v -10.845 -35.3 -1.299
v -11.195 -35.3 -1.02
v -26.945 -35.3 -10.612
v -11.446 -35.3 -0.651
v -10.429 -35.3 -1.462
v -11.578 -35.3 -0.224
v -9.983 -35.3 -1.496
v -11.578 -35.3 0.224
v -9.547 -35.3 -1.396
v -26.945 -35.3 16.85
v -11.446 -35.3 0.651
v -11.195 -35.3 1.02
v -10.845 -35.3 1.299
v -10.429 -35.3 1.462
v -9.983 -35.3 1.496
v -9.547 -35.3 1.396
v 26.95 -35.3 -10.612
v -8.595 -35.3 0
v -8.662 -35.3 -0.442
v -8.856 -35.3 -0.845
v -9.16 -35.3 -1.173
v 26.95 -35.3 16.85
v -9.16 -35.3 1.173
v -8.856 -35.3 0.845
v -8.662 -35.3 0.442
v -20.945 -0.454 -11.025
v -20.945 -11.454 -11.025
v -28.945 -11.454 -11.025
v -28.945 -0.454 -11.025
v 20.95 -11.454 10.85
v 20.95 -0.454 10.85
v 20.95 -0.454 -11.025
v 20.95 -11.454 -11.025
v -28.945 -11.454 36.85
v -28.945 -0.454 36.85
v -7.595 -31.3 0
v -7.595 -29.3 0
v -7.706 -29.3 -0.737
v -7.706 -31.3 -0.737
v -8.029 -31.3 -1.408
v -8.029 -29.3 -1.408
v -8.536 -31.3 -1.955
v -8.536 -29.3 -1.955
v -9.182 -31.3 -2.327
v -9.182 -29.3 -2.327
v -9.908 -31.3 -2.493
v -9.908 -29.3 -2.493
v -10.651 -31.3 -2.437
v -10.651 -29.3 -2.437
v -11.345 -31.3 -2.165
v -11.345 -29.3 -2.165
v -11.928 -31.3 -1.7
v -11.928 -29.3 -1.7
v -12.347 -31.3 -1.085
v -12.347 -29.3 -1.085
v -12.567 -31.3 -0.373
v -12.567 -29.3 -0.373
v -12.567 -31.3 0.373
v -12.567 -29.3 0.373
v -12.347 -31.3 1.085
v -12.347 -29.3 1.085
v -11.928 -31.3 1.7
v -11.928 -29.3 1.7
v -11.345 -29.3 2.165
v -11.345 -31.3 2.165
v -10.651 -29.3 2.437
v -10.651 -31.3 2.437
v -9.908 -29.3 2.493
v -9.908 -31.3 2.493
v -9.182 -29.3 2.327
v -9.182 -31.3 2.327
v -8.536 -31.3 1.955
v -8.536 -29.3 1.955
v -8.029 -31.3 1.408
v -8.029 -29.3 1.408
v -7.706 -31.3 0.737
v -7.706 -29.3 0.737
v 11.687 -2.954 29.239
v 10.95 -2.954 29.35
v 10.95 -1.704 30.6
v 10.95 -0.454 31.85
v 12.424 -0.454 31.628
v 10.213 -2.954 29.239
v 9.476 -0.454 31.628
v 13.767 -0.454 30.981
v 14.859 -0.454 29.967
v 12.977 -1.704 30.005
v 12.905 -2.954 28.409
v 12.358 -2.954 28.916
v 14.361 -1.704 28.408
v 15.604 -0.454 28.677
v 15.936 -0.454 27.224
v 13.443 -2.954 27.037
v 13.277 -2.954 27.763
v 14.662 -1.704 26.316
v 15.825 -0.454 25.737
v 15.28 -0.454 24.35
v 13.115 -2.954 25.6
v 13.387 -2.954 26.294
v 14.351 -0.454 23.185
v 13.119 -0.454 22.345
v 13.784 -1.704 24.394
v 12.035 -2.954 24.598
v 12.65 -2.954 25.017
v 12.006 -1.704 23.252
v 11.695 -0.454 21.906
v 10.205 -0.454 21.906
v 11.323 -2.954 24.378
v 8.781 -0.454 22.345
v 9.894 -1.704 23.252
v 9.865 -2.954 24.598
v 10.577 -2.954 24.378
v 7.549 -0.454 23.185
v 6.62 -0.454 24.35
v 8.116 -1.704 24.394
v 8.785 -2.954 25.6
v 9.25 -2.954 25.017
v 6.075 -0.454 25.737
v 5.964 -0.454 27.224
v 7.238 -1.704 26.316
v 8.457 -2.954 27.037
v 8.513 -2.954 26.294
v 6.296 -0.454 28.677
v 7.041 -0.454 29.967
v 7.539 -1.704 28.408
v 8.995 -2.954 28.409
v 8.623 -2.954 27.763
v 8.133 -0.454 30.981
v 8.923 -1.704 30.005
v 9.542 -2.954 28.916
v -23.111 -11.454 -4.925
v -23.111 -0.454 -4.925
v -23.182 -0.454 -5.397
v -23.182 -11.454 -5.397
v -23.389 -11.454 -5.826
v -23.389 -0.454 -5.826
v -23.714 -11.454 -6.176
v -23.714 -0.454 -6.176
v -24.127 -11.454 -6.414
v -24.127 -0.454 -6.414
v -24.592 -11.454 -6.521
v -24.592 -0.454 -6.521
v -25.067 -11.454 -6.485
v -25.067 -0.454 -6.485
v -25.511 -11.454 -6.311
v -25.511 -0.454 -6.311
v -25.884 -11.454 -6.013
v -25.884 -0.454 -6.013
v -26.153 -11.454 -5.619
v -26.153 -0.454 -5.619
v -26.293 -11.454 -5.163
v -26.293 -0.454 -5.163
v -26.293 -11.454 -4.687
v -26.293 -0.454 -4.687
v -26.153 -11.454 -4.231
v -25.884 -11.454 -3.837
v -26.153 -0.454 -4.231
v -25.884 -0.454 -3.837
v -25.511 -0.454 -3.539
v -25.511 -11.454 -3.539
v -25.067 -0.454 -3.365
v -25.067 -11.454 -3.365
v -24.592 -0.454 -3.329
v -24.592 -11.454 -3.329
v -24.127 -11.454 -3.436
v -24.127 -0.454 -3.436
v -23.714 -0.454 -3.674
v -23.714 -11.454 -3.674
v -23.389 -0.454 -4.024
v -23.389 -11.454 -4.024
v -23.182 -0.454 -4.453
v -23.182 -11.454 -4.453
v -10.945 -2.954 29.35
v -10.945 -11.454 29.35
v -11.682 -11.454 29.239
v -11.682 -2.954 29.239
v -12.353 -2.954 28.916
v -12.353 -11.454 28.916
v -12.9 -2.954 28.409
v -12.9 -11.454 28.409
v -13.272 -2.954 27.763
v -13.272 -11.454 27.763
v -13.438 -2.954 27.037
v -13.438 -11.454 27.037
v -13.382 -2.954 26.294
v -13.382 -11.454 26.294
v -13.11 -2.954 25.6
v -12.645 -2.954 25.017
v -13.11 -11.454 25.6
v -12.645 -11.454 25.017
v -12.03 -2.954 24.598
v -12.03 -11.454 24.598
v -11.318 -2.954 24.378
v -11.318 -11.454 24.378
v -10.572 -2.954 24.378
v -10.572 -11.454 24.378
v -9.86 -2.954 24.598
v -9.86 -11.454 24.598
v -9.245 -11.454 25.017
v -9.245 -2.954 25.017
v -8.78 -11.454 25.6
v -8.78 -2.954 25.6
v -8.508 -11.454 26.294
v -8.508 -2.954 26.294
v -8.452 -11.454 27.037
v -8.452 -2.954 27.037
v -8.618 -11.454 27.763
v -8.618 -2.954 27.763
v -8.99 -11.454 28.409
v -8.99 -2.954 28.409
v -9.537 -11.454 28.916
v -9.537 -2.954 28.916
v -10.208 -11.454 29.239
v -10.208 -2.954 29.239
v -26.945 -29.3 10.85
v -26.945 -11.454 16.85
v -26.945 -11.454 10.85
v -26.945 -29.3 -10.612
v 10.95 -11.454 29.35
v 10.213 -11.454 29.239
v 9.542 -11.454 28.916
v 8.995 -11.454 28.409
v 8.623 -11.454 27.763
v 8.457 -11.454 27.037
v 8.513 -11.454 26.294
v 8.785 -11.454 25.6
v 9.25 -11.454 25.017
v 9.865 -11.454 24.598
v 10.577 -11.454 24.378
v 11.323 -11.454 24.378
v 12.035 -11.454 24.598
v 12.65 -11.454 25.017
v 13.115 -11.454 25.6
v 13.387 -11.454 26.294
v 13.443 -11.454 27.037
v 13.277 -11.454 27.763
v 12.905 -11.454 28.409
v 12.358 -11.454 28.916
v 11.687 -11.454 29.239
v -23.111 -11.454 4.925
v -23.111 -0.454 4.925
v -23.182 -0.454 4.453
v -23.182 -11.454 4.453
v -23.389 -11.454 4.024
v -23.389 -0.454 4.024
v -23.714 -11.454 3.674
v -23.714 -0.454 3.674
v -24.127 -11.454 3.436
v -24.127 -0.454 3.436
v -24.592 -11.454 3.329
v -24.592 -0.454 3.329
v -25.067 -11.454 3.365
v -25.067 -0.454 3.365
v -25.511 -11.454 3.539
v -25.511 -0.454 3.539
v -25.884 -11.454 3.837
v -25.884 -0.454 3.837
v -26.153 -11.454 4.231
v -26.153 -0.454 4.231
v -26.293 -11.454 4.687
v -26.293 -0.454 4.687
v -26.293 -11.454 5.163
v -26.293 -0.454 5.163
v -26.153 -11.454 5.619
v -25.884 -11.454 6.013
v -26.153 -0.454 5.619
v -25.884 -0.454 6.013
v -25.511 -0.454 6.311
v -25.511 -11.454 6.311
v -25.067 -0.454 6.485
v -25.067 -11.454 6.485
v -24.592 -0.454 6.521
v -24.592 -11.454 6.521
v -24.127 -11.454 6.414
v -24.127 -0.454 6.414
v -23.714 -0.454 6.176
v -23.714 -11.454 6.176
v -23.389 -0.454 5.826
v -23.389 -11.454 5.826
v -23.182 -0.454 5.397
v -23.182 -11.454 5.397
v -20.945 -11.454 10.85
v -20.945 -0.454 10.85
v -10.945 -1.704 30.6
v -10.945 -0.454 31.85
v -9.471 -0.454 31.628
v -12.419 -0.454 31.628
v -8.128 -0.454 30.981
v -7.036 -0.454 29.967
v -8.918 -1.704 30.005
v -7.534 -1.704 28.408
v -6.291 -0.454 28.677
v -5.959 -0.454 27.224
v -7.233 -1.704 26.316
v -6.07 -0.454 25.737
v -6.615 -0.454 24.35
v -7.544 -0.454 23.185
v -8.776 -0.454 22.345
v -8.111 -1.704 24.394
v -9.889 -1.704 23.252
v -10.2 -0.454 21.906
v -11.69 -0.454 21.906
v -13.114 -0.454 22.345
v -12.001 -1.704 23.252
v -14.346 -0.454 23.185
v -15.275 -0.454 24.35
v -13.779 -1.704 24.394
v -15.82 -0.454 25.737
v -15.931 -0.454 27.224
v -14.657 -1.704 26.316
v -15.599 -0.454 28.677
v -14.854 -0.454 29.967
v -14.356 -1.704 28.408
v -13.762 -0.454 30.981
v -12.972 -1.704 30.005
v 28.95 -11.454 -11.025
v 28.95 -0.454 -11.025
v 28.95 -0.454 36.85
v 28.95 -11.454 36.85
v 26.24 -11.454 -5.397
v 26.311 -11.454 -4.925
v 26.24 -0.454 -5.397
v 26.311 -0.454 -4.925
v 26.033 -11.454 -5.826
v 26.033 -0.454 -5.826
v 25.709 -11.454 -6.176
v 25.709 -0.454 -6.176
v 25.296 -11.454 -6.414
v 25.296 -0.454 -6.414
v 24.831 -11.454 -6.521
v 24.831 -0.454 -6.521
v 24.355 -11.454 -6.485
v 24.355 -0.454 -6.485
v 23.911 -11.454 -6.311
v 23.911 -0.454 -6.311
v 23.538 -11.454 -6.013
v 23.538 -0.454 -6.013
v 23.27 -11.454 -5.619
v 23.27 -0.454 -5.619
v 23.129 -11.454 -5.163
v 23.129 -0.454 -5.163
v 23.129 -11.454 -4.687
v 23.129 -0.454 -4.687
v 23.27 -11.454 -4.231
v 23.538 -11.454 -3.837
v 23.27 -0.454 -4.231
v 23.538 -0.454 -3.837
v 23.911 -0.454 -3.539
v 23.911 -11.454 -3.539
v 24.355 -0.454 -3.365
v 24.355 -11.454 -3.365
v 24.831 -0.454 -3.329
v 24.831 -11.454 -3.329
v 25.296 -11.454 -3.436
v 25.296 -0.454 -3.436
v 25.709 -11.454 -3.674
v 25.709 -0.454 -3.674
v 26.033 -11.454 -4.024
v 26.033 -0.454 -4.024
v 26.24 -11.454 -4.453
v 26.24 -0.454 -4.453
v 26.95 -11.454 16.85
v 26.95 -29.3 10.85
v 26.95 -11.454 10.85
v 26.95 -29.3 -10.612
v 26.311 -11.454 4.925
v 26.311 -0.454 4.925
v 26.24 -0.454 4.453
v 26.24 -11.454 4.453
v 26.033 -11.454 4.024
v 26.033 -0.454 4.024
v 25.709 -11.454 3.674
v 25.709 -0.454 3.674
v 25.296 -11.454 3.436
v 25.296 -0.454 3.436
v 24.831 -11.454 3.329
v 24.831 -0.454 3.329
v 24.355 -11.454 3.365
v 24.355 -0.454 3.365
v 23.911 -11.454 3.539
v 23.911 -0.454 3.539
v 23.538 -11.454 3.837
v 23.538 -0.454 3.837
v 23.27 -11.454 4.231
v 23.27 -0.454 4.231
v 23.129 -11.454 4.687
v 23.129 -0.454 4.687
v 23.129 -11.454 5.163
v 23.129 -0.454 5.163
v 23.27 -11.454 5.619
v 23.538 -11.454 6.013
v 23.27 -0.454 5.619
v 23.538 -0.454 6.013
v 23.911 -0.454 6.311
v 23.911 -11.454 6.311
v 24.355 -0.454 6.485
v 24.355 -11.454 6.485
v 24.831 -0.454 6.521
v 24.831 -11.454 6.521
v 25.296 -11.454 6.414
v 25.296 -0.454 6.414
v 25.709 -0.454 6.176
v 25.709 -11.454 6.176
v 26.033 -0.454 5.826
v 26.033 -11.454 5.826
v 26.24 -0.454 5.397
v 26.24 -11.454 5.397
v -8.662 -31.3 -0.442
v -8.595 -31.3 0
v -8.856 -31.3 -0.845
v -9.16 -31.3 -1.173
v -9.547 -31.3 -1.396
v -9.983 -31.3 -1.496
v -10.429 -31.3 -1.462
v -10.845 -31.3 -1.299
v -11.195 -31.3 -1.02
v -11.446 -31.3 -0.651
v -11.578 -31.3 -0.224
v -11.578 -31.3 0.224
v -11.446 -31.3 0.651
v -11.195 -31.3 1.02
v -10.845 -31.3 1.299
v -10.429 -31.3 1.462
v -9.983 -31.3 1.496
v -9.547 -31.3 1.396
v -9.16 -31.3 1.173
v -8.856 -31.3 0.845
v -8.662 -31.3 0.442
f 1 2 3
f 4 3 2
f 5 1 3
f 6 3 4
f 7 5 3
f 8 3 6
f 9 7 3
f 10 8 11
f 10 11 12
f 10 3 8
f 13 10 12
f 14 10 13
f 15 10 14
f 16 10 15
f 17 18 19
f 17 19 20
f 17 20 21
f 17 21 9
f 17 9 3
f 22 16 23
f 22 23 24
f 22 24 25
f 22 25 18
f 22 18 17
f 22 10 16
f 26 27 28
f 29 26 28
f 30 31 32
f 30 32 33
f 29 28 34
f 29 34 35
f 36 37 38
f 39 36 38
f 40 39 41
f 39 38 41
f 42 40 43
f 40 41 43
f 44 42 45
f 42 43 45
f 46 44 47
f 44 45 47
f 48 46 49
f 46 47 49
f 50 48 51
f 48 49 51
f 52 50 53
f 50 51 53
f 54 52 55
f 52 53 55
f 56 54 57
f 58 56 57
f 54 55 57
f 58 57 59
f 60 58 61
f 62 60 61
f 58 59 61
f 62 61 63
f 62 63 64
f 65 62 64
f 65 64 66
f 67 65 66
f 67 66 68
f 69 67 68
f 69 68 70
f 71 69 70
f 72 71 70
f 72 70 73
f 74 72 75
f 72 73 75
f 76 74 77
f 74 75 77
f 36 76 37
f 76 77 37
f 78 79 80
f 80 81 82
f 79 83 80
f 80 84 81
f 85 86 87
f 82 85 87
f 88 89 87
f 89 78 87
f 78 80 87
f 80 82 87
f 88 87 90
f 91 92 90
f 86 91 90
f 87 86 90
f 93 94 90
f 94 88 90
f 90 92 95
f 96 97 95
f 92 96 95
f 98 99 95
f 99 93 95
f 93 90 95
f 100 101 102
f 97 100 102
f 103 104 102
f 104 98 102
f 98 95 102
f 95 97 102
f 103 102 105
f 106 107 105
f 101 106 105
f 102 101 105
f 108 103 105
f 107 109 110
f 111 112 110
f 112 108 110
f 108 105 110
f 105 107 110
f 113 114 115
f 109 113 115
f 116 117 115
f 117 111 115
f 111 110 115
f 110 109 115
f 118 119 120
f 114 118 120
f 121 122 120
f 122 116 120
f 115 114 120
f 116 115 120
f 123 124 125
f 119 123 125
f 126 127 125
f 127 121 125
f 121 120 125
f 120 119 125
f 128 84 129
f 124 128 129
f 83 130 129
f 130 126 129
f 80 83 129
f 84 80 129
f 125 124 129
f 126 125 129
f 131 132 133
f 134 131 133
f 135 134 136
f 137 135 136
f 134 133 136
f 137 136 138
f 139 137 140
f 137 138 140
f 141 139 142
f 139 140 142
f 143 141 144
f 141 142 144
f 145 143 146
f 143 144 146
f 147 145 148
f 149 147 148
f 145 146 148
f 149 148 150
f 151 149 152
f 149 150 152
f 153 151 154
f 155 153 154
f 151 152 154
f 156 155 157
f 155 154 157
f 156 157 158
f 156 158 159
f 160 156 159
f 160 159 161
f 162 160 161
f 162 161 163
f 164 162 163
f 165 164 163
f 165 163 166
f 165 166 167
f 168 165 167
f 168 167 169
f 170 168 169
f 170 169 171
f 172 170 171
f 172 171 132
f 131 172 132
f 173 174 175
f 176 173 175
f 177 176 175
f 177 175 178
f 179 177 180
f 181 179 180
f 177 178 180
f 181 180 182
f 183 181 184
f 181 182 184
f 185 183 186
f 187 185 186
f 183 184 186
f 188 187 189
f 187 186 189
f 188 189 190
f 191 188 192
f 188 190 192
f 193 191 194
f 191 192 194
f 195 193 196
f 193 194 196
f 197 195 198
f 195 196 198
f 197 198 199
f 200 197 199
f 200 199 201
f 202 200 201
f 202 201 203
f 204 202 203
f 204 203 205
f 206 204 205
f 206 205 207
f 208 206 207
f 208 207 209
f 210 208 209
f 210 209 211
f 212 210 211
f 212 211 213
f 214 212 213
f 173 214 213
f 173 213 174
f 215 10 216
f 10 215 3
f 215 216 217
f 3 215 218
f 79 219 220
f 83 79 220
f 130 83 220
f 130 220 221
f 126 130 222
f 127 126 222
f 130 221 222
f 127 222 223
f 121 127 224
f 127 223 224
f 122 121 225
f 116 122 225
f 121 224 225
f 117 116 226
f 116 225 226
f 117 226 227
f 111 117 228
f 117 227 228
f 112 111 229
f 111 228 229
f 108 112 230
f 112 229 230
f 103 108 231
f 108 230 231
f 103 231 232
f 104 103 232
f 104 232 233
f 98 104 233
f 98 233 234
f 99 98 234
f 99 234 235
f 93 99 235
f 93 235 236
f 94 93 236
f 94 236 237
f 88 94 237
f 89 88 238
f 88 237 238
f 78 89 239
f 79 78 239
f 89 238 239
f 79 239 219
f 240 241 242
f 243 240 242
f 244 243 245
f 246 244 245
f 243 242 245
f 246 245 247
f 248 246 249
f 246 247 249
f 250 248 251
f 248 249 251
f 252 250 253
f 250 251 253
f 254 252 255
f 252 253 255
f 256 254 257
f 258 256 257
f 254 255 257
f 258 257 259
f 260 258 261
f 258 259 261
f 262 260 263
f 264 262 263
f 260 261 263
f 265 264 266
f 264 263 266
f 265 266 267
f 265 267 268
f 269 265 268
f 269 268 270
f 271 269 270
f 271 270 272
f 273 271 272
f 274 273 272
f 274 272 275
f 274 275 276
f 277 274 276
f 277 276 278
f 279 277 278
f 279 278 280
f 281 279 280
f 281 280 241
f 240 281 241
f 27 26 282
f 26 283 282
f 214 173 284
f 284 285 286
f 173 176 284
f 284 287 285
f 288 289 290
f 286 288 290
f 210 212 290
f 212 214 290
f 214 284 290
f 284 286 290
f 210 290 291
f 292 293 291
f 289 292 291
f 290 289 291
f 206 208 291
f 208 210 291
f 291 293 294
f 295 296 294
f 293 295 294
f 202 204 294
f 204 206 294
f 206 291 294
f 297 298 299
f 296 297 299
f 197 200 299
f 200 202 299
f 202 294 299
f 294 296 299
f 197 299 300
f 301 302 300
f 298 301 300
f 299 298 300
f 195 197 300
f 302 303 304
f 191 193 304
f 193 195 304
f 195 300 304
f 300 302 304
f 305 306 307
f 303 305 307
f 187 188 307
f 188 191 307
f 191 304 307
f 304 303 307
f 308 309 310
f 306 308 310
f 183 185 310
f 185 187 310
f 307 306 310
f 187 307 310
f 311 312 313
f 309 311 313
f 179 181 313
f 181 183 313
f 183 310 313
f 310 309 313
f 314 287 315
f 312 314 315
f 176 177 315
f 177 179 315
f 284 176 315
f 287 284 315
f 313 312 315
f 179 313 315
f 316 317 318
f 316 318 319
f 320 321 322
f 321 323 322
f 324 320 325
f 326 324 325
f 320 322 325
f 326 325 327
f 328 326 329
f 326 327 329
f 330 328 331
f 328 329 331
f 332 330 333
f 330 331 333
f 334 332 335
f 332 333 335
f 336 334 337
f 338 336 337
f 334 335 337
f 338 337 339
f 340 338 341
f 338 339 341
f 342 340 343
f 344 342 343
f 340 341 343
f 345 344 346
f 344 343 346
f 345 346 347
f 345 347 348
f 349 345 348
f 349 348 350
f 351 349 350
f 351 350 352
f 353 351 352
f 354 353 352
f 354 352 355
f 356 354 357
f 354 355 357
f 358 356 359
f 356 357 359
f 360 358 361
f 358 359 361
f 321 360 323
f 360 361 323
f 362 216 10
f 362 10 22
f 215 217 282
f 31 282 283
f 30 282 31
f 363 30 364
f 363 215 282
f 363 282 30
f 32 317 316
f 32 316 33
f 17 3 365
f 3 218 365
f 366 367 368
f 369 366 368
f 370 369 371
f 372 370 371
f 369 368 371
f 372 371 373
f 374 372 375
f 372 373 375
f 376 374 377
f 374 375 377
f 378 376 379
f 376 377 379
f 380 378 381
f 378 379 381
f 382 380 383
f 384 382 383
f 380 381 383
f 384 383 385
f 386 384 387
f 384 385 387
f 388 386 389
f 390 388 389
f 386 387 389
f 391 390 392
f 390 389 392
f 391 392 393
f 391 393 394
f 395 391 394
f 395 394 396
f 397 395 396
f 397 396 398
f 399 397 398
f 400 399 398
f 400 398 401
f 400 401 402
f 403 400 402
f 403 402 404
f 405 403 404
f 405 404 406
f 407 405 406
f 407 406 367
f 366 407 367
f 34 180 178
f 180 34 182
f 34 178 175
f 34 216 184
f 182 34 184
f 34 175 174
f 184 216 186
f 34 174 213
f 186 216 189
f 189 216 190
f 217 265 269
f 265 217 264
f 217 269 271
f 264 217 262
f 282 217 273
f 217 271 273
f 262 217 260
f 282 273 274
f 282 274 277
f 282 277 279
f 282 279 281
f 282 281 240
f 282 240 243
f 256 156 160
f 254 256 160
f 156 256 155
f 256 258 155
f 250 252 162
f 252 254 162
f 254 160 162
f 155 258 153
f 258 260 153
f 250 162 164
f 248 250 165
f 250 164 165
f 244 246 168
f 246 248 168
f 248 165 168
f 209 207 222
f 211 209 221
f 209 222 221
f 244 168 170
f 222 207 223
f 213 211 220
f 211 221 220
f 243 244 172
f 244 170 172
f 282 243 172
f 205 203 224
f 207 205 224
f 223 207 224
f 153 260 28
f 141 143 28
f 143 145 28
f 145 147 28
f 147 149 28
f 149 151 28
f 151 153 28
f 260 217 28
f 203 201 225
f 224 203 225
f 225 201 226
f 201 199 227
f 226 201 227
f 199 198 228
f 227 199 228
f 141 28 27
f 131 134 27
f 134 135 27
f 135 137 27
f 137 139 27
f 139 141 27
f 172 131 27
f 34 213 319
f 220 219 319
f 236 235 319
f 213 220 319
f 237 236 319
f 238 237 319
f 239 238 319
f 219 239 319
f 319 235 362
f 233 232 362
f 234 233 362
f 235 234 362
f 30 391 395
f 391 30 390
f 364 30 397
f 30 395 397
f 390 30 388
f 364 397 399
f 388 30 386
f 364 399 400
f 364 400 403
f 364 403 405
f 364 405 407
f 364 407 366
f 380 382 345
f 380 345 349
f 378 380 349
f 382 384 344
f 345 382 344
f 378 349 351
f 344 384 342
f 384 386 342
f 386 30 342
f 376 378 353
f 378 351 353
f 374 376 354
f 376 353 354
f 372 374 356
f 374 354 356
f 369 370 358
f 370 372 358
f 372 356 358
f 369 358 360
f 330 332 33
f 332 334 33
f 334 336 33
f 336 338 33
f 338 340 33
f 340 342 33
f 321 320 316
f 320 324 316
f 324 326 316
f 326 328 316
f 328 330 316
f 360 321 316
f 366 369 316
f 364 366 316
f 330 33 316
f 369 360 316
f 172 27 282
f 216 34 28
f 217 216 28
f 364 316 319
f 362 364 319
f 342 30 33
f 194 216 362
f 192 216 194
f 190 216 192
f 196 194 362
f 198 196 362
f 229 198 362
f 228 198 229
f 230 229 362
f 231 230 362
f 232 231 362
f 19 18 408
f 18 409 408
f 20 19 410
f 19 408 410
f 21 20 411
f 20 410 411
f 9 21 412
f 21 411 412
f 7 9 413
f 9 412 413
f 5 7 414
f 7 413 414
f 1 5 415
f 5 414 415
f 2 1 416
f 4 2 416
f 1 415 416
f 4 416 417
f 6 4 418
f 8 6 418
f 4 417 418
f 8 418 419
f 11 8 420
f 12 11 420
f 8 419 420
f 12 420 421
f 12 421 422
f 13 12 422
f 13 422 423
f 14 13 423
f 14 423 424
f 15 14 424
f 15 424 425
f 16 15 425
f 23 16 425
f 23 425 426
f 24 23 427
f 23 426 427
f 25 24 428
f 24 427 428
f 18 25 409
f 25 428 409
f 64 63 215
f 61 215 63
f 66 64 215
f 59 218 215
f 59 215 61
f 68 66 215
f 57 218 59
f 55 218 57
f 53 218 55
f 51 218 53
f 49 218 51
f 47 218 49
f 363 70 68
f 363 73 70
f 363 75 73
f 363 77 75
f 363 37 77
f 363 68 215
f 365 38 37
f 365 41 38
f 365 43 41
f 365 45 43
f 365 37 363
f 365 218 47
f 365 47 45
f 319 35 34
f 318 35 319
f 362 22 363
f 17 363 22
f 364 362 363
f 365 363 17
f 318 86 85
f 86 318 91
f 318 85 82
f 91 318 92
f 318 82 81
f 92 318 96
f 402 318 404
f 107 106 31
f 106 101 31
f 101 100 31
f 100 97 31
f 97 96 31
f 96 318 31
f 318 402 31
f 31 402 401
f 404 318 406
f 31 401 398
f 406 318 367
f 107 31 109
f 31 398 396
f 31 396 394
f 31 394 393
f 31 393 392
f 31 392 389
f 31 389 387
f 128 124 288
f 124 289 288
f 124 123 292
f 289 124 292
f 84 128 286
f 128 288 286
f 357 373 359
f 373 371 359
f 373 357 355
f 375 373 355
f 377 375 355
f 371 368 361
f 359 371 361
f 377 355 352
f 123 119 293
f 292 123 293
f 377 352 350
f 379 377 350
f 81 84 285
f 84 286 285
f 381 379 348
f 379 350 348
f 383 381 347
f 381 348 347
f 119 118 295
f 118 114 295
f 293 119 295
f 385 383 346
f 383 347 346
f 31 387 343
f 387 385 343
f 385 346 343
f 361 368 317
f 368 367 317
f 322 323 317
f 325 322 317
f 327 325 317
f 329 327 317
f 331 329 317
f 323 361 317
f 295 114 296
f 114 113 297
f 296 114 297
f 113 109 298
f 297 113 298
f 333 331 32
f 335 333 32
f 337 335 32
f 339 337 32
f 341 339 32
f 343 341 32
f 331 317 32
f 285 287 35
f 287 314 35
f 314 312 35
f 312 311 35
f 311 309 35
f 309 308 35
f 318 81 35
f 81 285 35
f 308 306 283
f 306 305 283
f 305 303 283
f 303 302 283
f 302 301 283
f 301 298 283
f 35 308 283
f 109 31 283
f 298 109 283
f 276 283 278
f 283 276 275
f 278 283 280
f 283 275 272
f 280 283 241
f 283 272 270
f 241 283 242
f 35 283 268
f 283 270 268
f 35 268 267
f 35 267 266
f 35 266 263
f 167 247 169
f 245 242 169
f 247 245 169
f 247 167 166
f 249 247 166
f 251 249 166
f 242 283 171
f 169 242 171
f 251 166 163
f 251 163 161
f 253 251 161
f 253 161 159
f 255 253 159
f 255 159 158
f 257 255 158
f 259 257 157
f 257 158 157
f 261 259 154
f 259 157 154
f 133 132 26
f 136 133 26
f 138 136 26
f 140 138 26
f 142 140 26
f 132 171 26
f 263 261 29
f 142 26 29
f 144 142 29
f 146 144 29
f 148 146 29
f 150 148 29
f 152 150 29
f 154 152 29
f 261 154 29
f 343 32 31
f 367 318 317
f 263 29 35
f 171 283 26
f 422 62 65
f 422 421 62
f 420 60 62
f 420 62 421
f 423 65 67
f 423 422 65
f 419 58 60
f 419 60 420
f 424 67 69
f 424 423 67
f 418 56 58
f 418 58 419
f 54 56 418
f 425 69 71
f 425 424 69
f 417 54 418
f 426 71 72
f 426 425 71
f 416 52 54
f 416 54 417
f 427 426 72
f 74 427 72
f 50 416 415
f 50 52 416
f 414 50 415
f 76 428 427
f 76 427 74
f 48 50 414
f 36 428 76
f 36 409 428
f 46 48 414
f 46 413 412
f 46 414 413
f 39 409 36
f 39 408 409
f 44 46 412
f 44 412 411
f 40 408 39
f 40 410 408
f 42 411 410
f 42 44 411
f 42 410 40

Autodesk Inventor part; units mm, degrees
ref_plane "Work Plane1" through (-19.25, -0.5, 9.85) normal (0, 0, 1) x (1, 0, 0)
sketch "Sketch1" plane through (-19.25, -0.5, 9.85) normal (0, 0, 1) x (1, 0, 0)
  line L0 (-0.695, -27.8) -> (39.2, -27.8)
  line L1 (39.2, -27.8) -> (39.2, 8.9608)
  line L2 (39.2, 8.9608) -> (-0.695, 8.9608)
  line L3 (-0.695, 8.9608) -> (-0.695, -27.8)
  point P0 (19.25, 0.5)
extrude "Extrusion1" add sketch "Sketch1" along normal blind 3
ref_plane "Work Plane2" through (-19.25, -0.5, 12.85) normal (0, 0, 1) x (1, 0, 0)
sketch "Sketch2" plane through (-19.25, -0.5, 12.85) normal (0, 0, 1) x (1, 0, 0)
  line L0 (39.2, -27.8) -> (39.2, 8.9608) projected
  line L1 (39.2, -27.8) -> (-0.695, -27.8)
  line L2 (-0.695, -27.8) -> (-0.695, 8.9608)
  line L3 (-0.695, 8.9608) -> (39.2, 8.9608)
  line L4 (39.2, 8.9608) -> (39.2, -27.8)
  point P0 (19.25, 0.5)
  point P1 (39.2, 8.9608)
extrude "Extrusion2" add sketch "Sketch2" along normal blind 5
ref_plane "Work Plane4" through (19.95, -28.3, 9.85) normal (1, 0, 0) x (0, 0, -1)
sketch "Sketch3" plane through (19.95, -28.3, 9.85) normal (1, 0, 0) x (0, 0, -1)
  line L0 (0, 0) -> (0, 36.7608) projected
  line L1 (0, 0) -> (-8, 0) projected
  line L2 (0, 36.7608) -> (-2, 36.7608)
  line L3 (-2, 36.7608) -> (-2, 0)
  line L4 (-2, 0) -> (0, 0)
  line L5 (0, 0) -> (0, 36.7608)
  point P0 (9.85, 28.3)
  dimension "d4" = 2
extrude "Extrusion3" cut sketch "Sketch3" against normal blind 50
ref_plane "Work Plane3" through (19.95, -28.3, 17.85) normal (1, 0, 0) x (0, 0, -1)
sketch "Sketch4" plane through (19.95, -28.3, 17.85) normal (1, 0, 0) x (0, 0, -1)
  line L0 (6, 0) -> (0, 0) projected
  line L1 (6, 36.7608) -> (0, 36.7608) projected
  line L2 (0, 0) -> (1, 0)
  line L3 (1, 0) -> (1, 36.7608)
  line L4 (1, 36.7608) -> (0, 36.7608)
  line L5 (0, 36.7608) -> (0, 0)
  point P0 (17.85, 28.3)
  point P1 (1, 0)
  dimension "d7" = 1
extrude "Extrusion4" cut sketch "Sketch4" against normal blind 50
ref_plane "Work Plane5" through (19.95, -28.3, 11.85) normal (1, 0, 0) x (0, 0, -1)
sketch "Sketch5" plane through (19.95, -28.3, 11.85) normal (1, 0, 0) x (0, 0, -1)
  line L0 (-5, 36.7608) -> (-5, 0) projected
  line L1 (0, 0) -> (0, 36.7608) projected
  line L2 (-5, 36.7608) -> (0, 36.7608)
  line L3 (0, 36.7608) -> (0, 0)
  line L4 (0, 0) -> (-5, 0)
  line L5 (-5, 0) -> (-5, 36.7608)
  point P0 (11.85, 28.3)
extrude "Extrusion5" add sketch "Sketch5" along normal blind 7
ref_plane "Work Plane6" through (-19.945, -28.3, 11.85) normal (0, 0, -1) x (-1, 0, 0)
sketch "Sketch6" plane through (-19.945, -28.3, 11.85) normal (0, 0, -1) x (-1, 0, 0)
  line L0 (-46.895, 0) -> (-46.895, 36.7608) projected
  line L1 (-46.895, 27.8459) -> (-40.895, 27.8459)
  line L2 (-40.895, 27.8459) -> (-40.895, 11.8459)
  line L3 (-40.895, 11.8459) -> (-46.895, 11.8459)
  line L4 (-46.895, 11.8459) -> (-46.895, 27.8459)
  point P0 (-19.945, 28.3)
  dimension "d12" = 6
  dimension "d13" = 16
extrude "Extrusion6" add sketch "Sketch6" along normal blind 22.875
sketch "Sketch7" plane through (20.95, -0.4541, 11.85) normal (0, 1, 0) x (1, 0, 0)
  arc A0 (5.4164, 8.2173) -> (5.4164, 5.6327) centre (3.7611, 6.925) ccw projected
  circle A1 centre (3.7611, 6.925) radius 2.5
  arc A2 (5.4164, 18.0673) -> (5.4164, 15.4827) centre (3.7611, 16.775) ccw projected
  circle A3 centre (3.7611, 16.775) radius 2.5
  point P0 (-20.95, 11.85)
  dimension "d16" = 5
  dimension "d17" = 5
extrude "Extrusion7" cut sketch "Sketch7" against normal blind 22.875
ref_plane "Work Plane7" through (26.95, -28.3, 11.85) normal (1, 0, 0) x (0, 0, -1)
sketch "Sketch8" plane through (26.95, -28.3, 11.85) normal (1, 0, 0) x (0, 0, -1)
  line L0 (0, 11.8459) -> (22.875, 11.8459) projected
  line L1 (22.875, 27.8459) -> (22.875, 11.8459) projected
  line L2 (0, 11.8459) -> (22.875, 11.8459)
  line L3 (22.875, 11.8459) -> (22.875, 16.8459)
  line L4 (22.875, 16.8459) -> (0, 16.8459)
  line L5 (0, 16.8459) -> (0, 11.8459)
  point P0 (11.85, 28.3)
  dimension "d20" = 5
extrude "Extrusion8" cut sketch "Sketch8" against normal blind 6.7
ref_plane "Work Plane8" through (-19.945, -28.3, 11.85) normal (-1, 0, 0) x (0, 0, 1)
sketch "Sketch9" plane through (-19.945, -28.3, 11.85) normal (-1, 0, 0) x (0, 0, 1)
  line L0 (0, 36.7608) -> (0, 0) projected
  line L1 (5, 0) -> (0, 0) projected
  line L2 (0, 36.7608) -> (5, 36.7608)
  line L3 (5, 36.7608) -> (5, 0)
  line L4 (5, 0) -> (0, 0)
  line L5 (0, 0) -> (0, 36.7608)
  point P0 (-11.85, 28.3)
extrude "Extrusion9" add sketch "Sketch9" along normal blind 7
ref_plane "Work Plane10" through (26.95, -0.4541, 11.85) normal (0, 0, -1) x (-1, 0, 0)
sketch "Sketch11" plane through (26.95, -0.4541, 11.85) normal (0, 0, -1) x (-1, 0, 0)
  line L0 (53.895, -27.8459) -> (53.895, 8.9148) projected
  line L1 (53.895, 0) -> (47.895, 0)
  line L2 (47.895, 0) -> (47.895, -11)
  line L3 (47.895, -11) -> (53.895, -11)
  line L4 (53.895, -11) -> (53.895, 0)
  point P0 (26.95, 0.4541)
  dimension "d25" = 6
extrude "Extrusion10" add sketch "Sketch11" along normal blind 22.875
sketch "Sketch12" plane through (-26.945, -0.4541, 11.85) normal (0, 1, 0) x (1, 0, 0)
  arc A0 (0.5786, 15.4827) -> (0.5786, 18.0673) centre (2.2339, 16.775) ccw projected
  circle A1 centre (2.2339, 16.775) radius 2.5
  arc A2 (0.5786, 5.6327) -> (0.5786, 8.2173) centre (2.2339, 6.925) ccw projected
  circle A3 centre (2.2339, 6.925) radius 2.5
  point P0 (26.945, 11.85)
  dimension "d28" = 5
  dimension "d29" = 5
extrude "Extrusion11" cut sketch "Sketch12" against normal blind 22.875
ref_plane "Work Plane11" through (-26.945, -28.3, 11.85) normal (-1, 0, 0) x (0, 0, 1)
sketch "Sketch13" plane through (-26.945, -28.3, 11.85) normal (-1, 0, 0) x (0, 0, 1)
  line L0 (0, 16.8459) -> (0, 27.8459) projected
  line L1 (5, 36.7608) -> (0, 36.7608) projected
  line L2 (0, 27.8459) -> (5, 27.8459)
  line L3 (5, 27.8459) -> (5, 36.7608)
  line L4 (5, 36.7608) -> (0, 36.7608)
  line L5 (0, 36.7608) -> (0, 27.8459)
  point P0 (-11.85, 28.3)
extrude "Extrusion12" cut sketch "Sketch13" against normal blind 67.325
ref_plane "Work Plane9" through (26.95, -28.3, 11.85) normal (0, -1, 0) x (1, 0, 0)
sketch "Sketch14" plane through (26.95, -28.3, 11.85) normal (0, -1, 0) x (1, 0, 0)
  line L0 (0, 5) -> (0, 0) projected
  line L1 (0, 5) -> (-53.895, 5) projected
  line L2 (0, 0) -> (-53.895, 0)
  line L3 (-53.895, 0) -> (-53.895, 5)
  line L4 (-53.895, 5) -> (0, 5)
  line L5 (0, 5) -> (0, 0)
  point P0 (-26.95, -11.85)
extrude "Extrusion13" add sketch "Sketch14" along normal blind 5
ref_plane "Work Plane12" through (26.95, -11.4541, 11.85) normal (0, 0, -1) x (-1, 0, 0)
sketch "Sketch15" plane through (26.95, -11.4541, 11.85) normal (0, 0, -1) x (-1, 0, 0)
  line L0 (53.895, -21.8459) -> (0, -21.8459) projected
  line L1 (53.895, 11) -> (53.895, -21.8459) projected
  line L2 (0, -21.8459) -> (53.895, -21.8459)
  line L3 (53.895, -21.8459) -> (53.895, -17.8459)
  line L4 (53.895, -17.8459) -> (0, -17.8459)
  line L5 (0, -17.8459) -> (0, -21.8459)
  point P0 (26.95, 11.4541)
  dimension "d36" = 4
extrude "Extrusion14" add sketch "Sketch15" along normal blind 22.4625
ref_plane "Work Plane13" through (-26.945, -29.3, 11.85) normal (0, 1, 0) x (1, 0, 0)
sketch "Sketch16" plane through (-26.945, -29.3, 11.85) normal (0, 1, 0) x (1, 0, 0)
  line L0 (53.895, 0) -> (53.895, 22.4625) projected
  line L1 (0, 0) -> (0, 22.4625) projected
  line L2 (53.895, 0) -> (0, 0)
  line L3 (0, 0) -> (0, 1)
  line L4 (0, 1) -> (53.895, 1)
  line L5 (53.895, 1) -> (53.895, 0)
  point P0 (26.945, 11.85)
  point P1 (53.895, 1)
  dimension "d39" = 1
extrude "Extrusion15" add sketch "Sketch16" along normal blind 30
ref_plane "Work Plane14" through (26.95, -28.3, 11.85) normal (1, 0, 0) x (0, 0, -1)
sketch "Sketch17" plane through (26.95, -28.3, 11.85) normal (1, 0, 0) x (0, 0, -1)
  line L0 (0, 29) -> (1, 29) projected
  line L1 (5.8126, 27.8459) -> (1, 27.8459) projected
  line L2 (0, 29) -> (1, 29)
  line L3 (1, 29) -> (1, 27.8459)
  line L4 (1, 27.8459) -> (0, 27.8459)
  line L5 (0, 27.8459) -> (0, 29)
  point P0 (11.85, 28.3)
extrude "Extrusion16" cut sketch "Sketch17" against normal blind 100
sketch "Sketch19" plane through (26.95, -33.3, 11.85) normal (0, -1, 0) x (1, 0, 0)
  circle A0 centre (-16.85, -11.85) radius 5
  circle A1 centre (-16.85, -11.85) radius 1.5
  point P0 (-26.95, -11.85)
  dimension "d47" = 10
  dimension "d50" = 3
extrude "Extrusion20" cut sketch "Sketch19" against normal blind 10 contours A1
sketch "Sketch20" plane through (26.95, -33.3, 11.85) normal (0, -1, 0) x (1, 0, 0)
  line L0 (-53.895, -22.4625) -> (0, -22.4625) projected
  line L1 (-53.895, 5) -> (-53.895, -22.4625) projected
  line L2 (0, -22.4625) -> (-53.895, -22.4625)
  line L3 (-53.895, -22.4625) -> (-53.895, 5)
  line L4 (-53.895, 5) -> (0, 5)
  line L5 (0, 5) -> (0, -22.4625)
  point P0 (-26.95, -11.85)
extrude "Extrusion21" add sketch "Sketch20" along normal blind 2
sketch "Sketch21" plane through (-26.945, -29.3, -10.6125) normal (0, 1, 0) x (1, 0, 0)
  circle A0 centre (37.045, -10.6125) radius 1.5 projected
  circle A1 centre (37.045, -10.6125) radius 1.5
  point P0 (26.945, -10.6125)
extrude "Extrusion22" cut sketch "Sketch21" against normal blind 10
sketch "Sketch22" plane through (-26.945, -29.3, -10.6125) normal (0, 1, 0) x (1, 0, 0)
  circle A0 centre (37.045, -10.6125) radius 1.5 projected
  circle A1 centre (37.045, -10.6125) radius 2.5
  point P0 (26.945, -10.6125)
  dimension "d59" = 5
extrude "Extrusion23" cut sketch "Sketch22" against normal blind 2
sketch "Sketch23" plane through (-19.945, -28.3, -11.025) normal (0, 0, -1) x (-1, 0, 0)
  line L0 (-46.895, 27.8459) -> (-46.895, 16.8459) projected
  line L1 (-46.895, 27.8459) -> (-48.895, 27.8459)
  line L2 (-48.895, 27.8459) -> (-48.895, 16.8459)
  line L3 (-48.895, 16.8459) -> (-46.895, 16.8459)
  line L4 (-46.895, 16.8459) -> (-46.895, 27.8459)
  line L5 (7, 16.8459) -> (7, 27.8459) projected
  line L6 (7, 27.8459) -> (9, 27.8459)
  line L7 (9, 27.8459) -> (9, 16.8459)
  line L8 (9, 16.8459) -> (7, 16.8459)
  line L9 (7, 16.8459) -> (7, 27.8459)
  point P0 (-19.945, 28.3)
  dimension "d62" = 2
  dimension "d63" = 2
extrude "Extrusion24" add sketch "Sketch23" against normal up to surface (27.875 mm away)
sketch "Sketch24" plane through (-20.945, -0.4541, 10.85) normal (0, 1, 0) x (1, 0, 0)
  arc A0 (47.895, 7.0374) -> (47.895, 4.8126) centre (45.6561, 5.925) ccw projected
  circle A1 centre (45.6561, 5.925) radius 1.6
  arc A2 (47.895, 16.8874) -> (47.895, 14.6626) centre (45.6561, 15.775) ccw projected
  circle A3 centre (45.6561, 15.775) radius 1.6
  circle A4 centre (45.6561, 5.925) radius 2.5
  circle A5 centre (45.6561, 15.775) radius 2.5
  point P0 (20.945, 10.85)
  point P1 (47.895, 4.8126)
  dimension "d66" = 3.2
  dimension "d67" = 3.2
extrude "Extrusion25" add sketch "Sketch24" against normal up to surface (11 mm away)
sketch "Sketch25" plane through (-20.945, -0.4541, 10.85) normal (0, 1, 0) x (1, 0, 0)
  arc A0 (-6, 4.8025) -> (-6, 7.0475) centre (-3.7661, 5.925) ccw projected
  circle A1 centre (-3.7661, 5.925) radius 1.6
  arc A2 (-6, 14.6525) -> (-6, 16.8975) centre (-3.7661, 15.775) ccw projected
  circle A3 centre (-3.7661, 15.775) radius 1.6
  circle A4 centre (-3.7661, 15.775) radius 2.5
  circle A5 centre (-3.7661, 5.925) radius 2.5
  point P0 (20.945, 10.85)
  point P1 (-6, 7.0475)
  dimension "d70" = 3.2
  dimension "d71" = 3.2
  dimension "d72" = 5
  dimension "d73" = 5
extrude "Extrusion26" add sketch "Sketch25" against normal up to surface (11 mm away)
sketch "Sketch26" plane through (-26.945, -35.3, 16.85) normal (0, 0, 1) x (1, 0, 0)
  line L0 (55.895, 34.8459) -> (-2, 34.8459) projected
  line L1 (53.895, 23.8459) -> (55.895, 23.8459) projected
  line L2 (-2, 34.8459) -> (55.895, 34.8459)
  line L3 (55.895, 34.8459) -> (55.895, 23.8459)
  line L4 (55.895, 23.8459) -> (-2, 23.8459)
  line L5 (-2, 23.8459) -> (-2, 34.8459)
  point P0 (26.945, 35.3)
extrude "Extrusion27" add sketch "Sketch26" along normal blind 20
sketch "Sketch27" plane through (-20.945, -0.4541, 10.85) normal (0, 1, 0) x (1, 0, 0)
  line L0 (49.895, 21.875) -> (49.895, -26) projected
  line L1 (49.895, -26) -> (49.895, -16)
  line L2 (49.895, -16) -> (-8, -16)
  line L3 (-8, 21.875) -> (-8, -26) projected
  line L4 (49.895, -16) -> (31.895, -16)
  line L5 (-8, -16) -> (10, -16)
  circle A0 centre (31.895, -16) radius 5
  circle A1 centre (10, -16) radius 5
  point P0 (20.945, 10.85)
  dimension "d78" = 10
  dimension "d79" = 18
  dimension "d80" = 18
  dimension "d81" = 10
  dimension "d82" = 10
hole "Hole1" at (-10.945, -0.4541, 26.85) at (10.95, -0.4541, 26.85) direction (0, -1, 0) diameter 5 end through all countersink diameter 10 countersink angle 90
sketch "Sketch28" plane through (-26.945, -29.3, -10.6125) normal (0, 1, 0) x (1, 0, 0)
  circle A0 centre (37.045, -10.6125) radius 2.5 projected
  line L0 (37.045, -10.6125) -> (53.895, -10.6125)
  line L1 (53.895, 0) -> (53.895, -27.4625) projected
  line L2 (0, -27.4625) -> (0, 0) projected
  line L3 (0, -10.6125) -> (16.85, -10.6125)
  line L4 (0, -10.6125) -> (16.85, -10.6125) construction
  line L5 (16.85, -10.6125) -> (37.045, -10.6125)
  circle A1 centre (16.85, -10.6125) radius 1.5
  point P0 (26.945, -10.6125)
  dimension "d90" = 16.85
  dimension "d91" = 0
  dimension "d92" = 3
extrude "Extrusion28" cut sketch "Sketch28" against normal blind 10 contours A1 L3 L5 | L5 L3 A1
sketch "Sketch29" plane through (-26.945, -29.3, -10.6125) normal (0, 1, 0) x (1, 0, 0)
  circle A0 centre (16.85, -10.6125) radius 1.5 projected
  circle A1 centre (16.85, -10.6125) radius 2.5
  point P0 (26.945, -10.6125)
  dimension "d95" = 5
extrude "Extrusion29" cut sketch "Sketch29" against normal up to surface (2 mm away) contours A0 | A1
sketch "Sketch30" plane through (-26.945, -29.3, -10.6125) normal (0, 1, 0) x (1, 0, 0)
  circle A0 centre (37.045, -10.6125) radius 2.5 projected
  circle A1 centre (37.045, -10.6125) radius 2.5
  point P0 (26.945, -10.6125)
extrude "Extrusion30" add sketch "Sketch30" against normal up to surface (6 mm away)
properties part number "woodHold" material "钢"
